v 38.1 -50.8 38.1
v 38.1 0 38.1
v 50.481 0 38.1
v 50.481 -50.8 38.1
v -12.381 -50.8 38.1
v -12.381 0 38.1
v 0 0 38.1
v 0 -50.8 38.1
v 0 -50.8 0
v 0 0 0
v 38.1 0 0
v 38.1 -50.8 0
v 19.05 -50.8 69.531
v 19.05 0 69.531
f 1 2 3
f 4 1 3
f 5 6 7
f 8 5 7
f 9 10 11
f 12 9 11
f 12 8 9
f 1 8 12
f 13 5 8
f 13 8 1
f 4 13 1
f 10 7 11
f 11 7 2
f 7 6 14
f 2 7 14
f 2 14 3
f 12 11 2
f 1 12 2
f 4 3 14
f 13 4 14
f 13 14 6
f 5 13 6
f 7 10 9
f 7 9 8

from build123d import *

# Parameters (mm, degrees)
F0_W     = 38.1
F0_H     = 38.1
F0_R     = 6.58852
F1_DEPTH = 50.8


with BuildPart() as f1:
    # F0 (on Front) → F1 (new body)
    with BuildSketch(Plane.XZ):
        with Locations((19.05, 19.05)):
            Rectangle(F0_W, F0_H)
        with Locations((19.05, 19.05)):
            Circle(F0_R, mode=Mode.SUBTRACT)
        Polygon((-12.380896, 38.1), (0, 38.1), (38.1, 38.1), (50.480896, 38.1), (19.05, 69.530896), align=None)
        with Locations((19.05, 19.05)):
            Circle(F0_R)
    extrude(amount=F1_DEPTH)


solid = f1.part
